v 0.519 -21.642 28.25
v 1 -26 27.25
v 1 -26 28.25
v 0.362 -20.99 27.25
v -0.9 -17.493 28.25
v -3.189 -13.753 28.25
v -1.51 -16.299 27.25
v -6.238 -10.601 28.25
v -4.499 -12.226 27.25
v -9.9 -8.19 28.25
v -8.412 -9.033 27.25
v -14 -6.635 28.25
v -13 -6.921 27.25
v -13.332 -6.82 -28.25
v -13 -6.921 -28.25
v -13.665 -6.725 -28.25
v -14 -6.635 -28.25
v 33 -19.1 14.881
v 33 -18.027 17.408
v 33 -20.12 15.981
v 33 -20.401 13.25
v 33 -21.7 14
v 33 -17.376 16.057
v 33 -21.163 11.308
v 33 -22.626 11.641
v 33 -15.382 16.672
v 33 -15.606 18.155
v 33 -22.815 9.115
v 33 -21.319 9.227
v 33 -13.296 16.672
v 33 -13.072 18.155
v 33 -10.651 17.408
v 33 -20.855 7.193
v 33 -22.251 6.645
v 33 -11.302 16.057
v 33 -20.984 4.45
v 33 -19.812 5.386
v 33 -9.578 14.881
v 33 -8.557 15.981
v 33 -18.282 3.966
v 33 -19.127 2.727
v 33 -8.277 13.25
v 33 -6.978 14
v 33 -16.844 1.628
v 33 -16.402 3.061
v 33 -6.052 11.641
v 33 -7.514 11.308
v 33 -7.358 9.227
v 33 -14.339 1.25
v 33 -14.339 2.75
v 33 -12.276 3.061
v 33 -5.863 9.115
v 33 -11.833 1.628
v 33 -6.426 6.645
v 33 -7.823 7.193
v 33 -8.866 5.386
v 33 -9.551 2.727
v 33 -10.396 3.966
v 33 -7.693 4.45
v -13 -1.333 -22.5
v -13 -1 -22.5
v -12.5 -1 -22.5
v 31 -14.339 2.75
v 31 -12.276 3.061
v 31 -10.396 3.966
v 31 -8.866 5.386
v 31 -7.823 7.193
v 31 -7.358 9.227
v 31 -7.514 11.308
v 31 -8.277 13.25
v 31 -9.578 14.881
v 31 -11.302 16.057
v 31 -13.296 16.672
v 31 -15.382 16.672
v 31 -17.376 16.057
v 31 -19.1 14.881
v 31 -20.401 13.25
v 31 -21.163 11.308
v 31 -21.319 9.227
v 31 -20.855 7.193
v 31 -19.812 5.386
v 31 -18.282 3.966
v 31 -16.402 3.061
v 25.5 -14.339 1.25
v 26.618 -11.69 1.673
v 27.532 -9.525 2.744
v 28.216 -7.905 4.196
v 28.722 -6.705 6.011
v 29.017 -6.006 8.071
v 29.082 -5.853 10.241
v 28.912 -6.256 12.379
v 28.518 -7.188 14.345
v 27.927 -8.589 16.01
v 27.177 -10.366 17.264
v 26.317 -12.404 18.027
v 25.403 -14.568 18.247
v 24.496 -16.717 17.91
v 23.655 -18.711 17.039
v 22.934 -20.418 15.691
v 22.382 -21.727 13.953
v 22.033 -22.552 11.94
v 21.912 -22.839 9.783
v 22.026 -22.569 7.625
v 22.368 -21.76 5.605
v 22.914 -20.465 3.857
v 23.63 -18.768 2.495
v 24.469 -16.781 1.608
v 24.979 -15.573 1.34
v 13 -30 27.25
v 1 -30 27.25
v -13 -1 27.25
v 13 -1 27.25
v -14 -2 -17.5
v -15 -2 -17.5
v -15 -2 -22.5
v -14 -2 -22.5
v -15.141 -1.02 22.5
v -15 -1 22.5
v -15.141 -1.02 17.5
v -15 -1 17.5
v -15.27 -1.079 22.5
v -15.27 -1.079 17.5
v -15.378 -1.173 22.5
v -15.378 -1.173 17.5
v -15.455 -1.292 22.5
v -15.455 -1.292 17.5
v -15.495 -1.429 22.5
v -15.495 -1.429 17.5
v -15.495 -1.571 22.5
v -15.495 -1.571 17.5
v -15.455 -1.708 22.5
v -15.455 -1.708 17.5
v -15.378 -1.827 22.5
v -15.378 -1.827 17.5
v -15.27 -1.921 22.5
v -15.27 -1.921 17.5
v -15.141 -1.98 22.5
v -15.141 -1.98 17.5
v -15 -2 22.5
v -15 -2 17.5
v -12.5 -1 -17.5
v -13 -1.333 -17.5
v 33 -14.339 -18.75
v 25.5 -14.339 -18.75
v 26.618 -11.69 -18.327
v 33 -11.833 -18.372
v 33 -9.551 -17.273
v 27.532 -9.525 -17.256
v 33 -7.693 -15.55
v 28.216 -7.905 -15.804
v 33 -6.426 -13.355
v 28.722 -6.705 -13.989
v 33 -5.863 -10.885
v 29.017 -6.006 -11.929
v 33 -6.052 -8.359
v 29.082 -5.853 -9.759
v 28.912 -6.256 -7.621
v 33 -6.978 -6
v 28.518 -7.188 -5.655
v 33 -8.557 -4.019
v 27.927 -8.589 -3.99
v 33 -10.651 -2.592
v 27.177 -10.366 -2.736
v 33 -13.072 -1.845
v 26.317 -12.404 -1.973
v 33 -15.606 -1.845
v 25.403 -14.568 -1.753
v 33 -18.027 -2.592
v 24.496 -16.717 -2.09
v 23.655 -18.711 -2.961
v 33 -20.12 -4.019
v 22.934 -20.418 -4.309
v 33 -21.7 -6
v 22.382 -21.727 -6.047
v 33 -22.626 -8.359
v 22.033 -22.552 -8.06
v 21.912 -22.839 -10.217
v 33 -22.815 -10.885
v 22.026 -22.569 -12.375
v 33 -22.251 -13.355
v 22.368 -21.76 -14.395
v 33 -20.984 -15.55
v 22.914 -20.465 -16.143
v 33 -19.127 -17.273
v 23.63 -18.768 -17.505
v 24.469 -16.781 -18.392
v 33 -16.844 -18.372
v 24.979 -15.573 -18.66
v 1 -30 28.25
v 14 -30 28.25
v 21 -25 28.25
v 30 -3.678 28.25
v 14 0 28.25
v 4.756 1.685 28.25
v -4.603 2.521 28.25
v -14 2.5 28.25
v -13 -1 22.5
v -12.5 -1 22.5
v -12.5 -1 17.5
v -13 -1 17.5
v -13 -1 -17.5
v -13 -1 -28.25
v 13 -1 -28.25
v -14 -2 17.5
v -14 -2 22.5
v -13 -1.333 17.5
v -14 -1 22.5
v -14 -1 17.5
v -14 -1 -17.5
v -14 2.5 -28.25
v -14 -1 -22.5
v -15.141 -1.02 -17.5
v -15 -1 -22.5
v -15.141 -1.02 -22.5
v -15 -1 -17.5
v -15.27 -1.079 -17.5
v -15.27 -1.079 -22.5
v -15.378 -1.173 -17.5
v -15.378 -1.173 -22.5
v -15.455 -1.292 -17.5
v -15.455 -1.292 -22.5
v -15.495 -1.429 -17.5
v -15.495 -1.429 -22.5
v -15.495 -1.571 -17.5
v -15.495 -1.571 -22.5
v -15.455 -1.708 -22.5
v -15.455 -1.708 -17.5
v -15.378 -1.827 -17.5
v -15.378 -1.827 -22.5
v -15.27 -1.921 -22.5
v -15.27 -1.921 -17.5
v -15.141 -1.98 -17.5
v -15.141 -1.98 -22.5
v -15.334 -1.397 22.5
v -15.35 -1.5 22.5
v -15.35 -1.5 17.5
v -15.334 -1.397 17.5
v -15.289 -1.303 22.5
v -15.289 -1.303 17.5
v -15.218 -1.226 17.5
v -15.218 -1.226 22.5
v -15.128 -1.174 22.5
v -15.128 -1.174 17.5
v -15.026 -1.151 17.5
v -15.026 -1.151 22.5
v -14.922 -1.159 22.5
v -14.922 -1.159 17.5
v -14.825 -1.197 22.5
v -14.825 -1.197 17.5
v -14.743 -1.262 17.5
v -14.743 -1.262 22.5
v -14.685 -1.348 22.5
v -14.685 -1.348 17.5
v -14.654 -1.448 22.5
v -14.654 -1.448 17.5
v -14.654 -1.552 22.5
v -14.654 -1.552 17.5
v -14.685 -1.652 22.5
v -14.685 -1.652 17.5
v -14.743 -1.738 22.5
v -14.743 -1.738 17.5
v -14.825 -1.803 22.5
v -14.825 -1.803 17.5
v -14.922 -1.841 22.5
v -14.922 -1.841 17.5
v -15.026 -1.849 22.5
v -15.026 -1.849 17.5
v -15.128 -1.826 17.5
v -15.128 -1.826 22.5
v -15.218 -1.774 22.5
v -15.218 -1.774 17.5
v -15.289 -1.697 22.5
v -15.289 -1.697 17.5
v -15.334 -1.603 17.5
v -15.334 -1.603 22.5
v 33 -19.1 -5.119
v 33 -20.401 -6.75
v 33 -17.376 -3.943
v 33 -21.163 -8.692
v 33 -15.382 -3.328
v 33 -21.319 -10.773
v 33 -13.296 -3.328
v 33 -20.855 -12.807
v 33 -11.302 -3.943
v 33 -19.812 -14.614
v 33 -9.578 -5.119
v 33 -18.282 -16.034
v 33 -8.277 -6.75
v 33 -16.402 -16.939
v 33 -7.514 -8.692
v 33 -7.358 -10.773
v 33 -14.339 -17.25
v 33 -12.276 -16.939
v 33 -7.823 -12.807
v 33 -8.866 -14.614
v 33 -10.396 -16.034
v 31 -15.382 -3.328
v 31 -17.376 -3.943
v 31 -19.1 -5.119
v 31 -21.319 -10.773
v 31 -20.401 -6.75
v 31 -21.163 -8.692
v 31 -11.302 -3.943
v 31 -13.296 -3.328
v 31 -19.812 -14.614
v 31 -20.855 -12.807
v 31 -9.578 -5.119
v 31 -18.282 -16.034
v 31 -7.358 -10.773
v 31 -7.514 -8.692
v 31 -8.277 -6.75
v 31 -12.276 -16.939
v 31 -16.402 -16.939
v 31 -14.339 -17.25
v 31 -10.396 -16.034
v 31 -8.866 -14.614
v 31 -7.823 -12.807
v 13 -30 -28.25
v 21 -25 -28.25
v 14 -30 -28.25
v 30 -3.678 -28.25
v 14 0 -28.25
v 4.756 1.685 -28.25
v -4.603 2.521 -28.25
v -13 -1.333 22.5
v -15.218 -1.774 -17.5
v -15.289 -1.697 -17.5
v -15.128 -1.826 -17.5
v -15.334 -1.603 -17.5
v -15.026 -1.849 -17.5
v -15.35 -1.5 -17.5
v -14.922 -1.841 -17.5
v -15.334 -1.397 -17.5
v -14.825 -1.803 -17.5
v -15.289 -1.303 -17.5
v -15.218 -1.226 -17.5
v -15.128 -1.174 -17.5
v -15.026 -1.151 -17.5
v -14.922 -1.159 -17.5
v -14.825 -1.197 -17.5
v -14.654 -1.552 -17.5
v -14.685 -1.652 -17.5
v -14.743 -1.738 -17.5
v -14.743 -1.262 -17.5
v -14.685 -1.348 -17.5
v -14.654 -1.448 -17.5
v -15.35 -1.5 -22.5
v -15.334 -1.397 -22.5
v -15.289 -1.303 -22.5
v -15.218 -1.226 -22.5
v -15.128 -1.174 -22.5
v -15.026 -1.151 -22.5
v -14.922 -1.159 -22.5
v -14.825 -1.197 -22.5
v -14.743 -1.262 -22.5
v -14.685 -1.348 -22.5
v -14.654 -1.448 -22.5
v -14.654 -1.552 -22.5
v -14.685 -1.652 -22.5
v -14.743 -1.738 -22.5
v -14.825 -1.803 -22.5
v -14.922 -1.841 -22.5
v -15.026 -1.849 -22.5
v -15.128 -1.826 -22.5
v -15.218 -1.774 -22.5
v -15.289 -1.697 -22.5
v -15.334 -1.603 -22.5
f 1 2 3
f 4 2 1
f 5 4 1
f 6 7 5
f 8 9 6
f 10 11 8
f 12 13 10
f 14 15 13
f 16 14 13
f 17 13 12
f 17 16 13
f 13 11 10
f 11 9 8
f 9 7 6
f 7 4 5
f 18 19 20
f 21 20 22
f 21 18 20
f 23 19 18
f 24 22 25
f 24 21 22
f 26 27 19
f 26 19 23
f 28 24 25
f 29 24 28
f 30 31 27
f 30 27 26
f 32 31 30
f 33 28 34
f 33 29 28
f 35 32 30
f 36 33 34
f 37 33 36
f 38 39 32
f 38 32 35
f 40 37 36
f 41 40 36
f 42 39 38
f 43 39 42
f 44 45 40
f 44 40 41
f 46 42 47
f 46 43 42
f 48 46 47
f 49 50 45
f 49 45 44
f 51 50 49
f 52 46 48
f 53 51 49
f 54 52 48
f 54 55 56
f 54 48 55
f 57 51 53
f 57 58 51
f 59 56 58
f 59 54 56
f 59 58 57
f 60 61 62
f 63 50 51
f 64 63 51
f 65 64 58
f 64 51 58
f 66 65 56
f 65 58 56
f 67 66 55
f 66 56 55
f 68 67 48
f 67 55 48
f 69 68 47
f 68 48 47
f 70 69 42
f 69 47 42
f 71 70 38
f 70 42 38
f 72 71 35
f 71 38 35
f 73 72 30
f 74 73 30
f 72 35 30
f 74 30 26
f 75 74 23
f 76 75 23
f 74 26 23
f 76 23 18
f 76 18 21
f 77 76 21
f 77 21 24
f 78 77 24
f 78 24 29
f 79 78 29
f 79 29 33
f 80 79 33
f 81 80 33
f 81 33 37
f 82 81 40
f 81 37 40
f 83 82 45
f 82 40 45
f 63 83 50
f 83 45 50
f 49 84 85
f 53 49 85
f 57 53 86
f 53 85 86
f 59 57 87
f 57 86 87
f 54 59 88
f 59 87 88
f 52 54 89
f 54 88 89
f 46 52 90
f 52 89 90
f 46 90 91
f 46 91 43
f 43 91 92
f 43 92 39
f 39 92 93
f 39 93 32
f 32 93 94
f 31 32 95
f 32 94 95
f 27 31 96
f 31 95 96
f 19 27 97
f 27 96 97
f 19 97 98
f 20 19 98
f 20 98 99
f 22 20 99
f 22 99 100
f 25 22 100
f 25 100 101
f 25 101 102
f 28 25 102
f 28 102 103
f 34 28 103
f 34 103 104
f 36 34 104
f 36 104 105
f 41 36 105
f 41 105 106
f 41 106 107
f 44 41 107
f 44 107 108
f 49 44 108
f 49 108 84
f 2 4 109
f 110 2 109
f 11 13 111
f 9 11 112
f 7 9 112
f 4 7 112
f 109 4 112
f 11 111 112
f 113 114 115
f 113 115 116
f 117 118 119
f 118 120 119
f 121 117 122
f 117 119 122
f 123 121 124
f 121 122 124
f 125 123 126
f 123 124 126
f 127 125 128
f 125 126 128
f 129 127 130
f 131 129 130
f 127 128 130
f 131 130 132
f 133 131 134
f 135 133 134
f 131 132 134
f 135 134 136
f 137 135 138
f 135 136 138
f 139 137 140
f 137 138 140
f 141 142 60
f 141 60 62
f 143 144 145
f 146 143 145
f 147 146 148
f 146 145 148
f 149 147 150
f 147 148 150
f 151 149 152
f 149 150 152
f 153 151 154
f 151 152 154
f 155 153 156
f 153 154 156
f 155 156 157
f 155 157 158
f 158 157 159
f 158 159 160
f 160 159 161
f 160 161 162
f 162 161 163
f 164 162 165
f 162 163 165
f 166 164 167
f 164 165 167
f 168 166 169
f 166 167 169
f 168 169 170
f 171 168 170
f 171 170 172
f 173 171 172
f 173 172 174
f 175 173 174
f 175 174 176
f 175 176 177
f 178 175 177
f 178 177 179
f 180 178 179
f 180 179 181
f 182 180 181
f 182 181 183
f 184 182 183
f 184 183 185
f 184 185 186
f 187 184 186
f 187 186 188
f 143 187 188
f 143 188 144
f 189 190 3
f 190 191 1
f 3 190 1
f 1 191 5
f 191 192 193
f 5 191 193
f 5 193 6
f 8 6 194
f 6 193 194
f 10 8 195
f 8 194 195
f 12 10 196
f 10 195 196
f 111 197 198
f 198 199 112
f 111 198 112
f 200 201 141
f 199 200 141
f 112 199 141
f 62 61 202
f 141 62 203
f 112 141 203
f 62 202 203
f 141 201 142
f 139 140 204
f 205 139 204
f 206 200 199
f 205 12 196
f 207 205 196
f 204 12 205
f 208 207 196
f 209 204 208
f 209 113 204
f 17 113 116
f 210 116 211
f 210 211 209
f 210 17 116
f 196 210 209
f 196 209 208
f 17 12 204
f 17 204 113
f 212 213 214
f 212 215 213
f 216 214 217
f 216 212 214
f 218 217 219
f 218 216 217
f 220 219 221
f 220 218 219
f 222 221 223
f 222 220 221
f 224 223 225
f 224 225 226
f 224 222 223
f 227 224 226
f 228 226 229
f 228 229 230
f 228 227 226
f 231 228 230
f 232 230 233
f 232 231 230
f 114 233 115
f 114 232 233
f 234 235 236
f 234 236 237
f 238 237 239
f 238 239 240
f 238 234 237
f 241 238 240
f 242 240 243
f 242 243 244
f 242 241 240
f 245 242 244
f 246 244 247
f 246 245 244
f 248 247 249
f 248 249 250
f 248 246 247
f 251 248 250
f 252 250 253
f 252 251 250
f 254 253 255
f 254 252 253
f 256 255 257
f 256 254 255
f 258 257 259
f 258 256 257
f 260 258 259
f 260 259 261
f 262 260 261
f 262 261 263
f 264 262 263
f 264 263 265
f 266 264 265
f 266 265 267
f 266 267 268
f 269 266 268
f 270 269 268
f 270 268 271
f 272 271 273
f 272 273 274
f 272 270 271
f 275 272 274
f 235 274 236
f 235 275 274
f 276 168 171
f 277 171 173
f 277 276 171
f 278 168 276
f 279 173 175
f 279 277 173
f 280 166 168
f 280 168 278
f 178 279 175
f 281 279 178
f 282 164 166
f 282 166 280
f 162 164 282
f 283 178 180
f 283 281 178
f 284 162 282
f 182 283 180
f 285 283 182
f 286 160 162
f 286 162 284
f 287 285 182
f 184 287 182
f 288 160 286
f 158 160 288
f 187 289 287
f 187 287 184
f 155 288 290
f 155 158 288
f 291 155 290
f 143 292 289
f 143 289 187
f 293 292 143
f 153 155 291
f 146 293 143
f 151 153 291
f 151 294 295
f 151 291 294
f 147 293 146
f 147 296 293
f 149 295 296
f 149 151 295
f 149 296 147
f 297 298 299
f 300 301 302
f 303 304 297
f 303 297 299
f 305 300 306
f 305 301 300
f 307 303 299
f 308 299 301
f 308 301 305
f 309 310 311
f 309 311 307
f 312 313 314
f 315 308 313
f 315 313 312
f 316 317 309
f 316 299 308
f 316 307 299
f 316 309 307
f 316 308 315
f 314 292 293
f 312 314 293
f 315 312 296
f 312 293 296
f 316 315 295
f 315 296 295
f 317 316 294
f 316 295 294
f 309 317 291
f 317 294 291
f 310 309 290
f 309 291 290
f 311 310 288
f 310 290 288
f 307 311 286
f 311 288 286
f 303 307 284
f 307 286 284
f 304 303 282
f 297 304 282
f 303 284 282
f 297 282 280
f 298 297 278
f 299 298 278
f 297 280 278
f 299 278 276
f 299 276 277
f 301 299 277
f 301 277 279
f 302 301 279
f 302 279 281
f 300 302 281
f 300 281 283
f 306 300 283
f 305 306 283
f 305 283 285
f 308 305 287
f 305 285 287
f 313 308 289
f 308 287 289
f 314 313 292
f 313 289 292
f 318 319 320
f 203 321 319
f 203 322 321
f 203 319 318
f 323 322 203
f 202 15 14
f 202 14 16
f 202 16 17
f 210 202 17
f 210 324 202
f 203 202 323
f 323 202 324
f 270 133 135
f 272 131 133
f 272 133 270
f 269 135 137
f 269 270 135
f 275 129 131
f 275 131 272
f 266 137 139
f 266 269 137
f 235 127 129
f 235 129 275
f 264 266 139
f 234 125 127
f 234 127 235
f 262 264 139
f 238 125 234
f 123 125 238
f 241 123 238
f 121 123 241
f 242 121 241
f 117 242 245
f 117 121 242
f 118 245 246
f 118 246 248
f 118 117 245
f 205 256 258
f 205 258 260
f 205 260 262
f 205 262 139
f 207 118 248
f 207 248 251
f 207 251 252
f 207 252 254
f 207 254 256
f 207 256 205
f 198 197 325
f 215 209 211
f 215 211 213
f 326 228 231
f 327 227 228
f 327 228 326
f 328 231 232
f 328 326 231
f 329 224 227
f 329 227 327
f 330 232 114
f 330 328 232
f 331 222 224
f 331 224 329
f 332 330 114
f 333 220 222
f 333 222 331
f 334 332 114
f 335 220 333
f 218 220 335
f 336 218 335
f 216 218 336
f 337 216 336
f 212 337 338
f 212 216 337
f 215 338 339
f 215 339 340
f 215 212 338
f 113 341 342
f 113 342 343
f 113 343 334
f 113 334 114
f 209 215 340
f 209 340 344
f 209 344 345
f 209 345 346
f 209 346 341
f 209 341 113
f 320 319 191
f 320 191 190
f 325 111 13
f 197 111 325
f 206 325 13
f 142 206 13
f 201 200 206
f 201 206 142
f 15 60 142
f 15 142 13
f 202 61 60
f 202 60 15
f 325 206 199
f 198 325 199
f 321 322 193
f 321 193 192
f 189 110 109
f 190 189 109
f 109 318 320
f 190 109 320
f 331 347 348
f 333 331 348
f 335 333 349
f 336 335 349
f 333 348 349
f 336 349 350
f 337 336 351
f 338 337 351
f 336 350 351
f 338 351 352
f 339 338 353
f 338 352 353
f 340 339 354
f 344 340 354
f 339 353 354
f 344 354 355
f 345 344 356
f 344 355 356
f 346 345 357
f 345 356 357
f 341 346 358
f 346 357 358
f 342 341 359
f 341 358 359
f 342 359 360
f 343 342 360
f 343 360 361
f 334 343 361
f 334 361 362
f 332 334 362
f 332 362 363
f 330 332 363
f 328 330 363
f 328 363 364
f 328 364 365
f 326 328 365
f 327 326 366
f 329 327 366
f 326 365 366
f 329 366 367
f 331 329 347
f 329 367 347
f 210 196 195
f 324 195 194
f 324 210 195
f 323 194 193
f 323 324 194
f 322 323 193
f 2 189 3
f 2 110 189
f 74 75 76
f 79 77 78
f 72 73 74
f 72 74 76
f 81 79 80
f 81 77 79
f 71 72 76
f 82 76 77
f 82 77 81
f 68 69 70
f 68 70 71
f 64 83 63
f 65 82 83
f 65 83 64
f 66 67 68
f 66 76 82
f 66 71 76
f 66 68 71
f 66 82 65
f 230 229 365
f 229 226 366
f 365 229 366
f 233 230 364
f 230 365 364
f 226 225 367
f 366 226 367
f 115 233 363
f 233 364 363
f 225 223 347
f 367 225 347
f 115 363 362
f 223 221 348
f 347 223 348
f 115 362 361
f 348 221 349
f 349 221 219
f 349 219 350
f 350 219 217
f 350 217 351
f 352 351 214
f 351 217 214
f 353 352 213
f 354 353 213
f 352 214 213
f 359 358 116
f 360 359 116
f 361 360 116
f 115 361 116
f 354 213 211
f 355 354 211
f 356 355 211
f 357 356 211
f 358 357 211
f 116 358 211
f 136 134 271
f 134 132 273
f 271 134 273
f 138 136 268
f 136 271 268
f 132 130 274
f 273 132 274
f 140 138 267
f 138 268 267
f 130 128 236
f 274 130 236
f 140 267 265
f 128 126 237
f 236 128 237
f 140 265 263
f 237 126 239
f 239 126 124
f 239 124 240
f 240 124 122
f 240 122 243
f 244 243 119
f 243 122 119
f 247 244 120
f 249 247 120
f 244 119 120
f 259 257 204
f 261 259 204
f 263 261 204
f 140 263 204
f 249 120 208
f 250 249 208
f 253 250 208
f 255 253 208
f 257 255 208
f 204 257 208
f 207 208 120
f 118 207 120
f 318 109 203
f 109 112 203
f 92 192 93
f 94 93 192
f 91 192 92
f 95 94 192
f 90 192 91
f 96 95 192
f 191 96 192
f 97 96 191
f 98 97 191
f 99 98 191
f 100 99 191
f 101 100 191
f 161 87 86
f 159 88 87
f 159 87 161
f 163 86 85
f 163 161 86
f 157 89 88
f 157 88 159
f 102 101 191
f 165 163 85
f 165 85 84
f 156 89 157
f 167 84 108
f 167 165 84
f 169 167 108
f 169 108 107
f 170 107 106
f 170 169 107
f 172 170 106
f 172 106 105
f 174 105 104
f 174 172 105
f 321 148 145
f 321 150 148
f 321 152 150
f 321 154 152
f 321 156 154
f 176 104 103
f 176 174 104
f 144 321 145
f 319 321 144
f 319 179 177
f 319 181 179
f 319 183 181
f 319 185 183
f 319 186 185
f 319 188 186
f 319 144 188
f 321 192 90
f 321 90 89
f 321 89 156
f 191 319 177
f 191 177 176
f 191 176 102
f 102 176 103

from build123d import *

# Parameters (mm, degrees)
SKETCH1_W           = 28
SKETCH1_H           = 56.5
BOSS_EXTRUDE1_DEPTH = 30
CUT_EXTRUDE2_DEPTH  = 56.5
SHELL1_T            = -1
BOSS_EXTRUDE3_DEPTH = 2.5
SKETCH4_R           = 0.35
CUT_EXTRUDE1_DEPTH  = 5
BOSS_EXTRUDE4_DEPTH = 56.5
BOSS_EXTRUDE5_START = -11.087816
SKETCH7_R           = 8.5
BOSS_EXTRUDE5_DEPTH = 11.087816
SKETCH8_R           = 7
CUT_EXTRUDE3_DEPTH  = 2
LPATTERN1_COUNT     = 2
LPATTERN1_PITCH     = 20


with BuildPart() as part:
    # Sketch1 → Boss-Extrude1 (new body)
    with BuildSketch(Plane(origin=(0, 0, 0), x_dir=(1, 0, 0), z_dir=(0, 1, 0))):
        Rectangle(SKETCH1_W, SKETCH1_H)
    extrude(amount=-BOSS_EXTRUDE1_DEPTH)

    # Sketch5 → Cut-Extrude2 (cut)
    with BuildSketch(Plane(origin=(0, 0, -28.25), x_dir=(-1, 0, 0), z_dir=(0, 0, -1))):
        with BuildLine():
            Line((-1, -30), (-1, -26))
            ThreePointArc((-1, -26), (3.188611699, -13.752551286), (14, -6.635083269))
            Line((14, -6.635083269), (14, -30))
            Line((14, -30), (-1, -30))
        make_face()
    extrude(amount=-CUT_EXTRUDE2_DEPTH, mode=Mode.SUBTRACT)

    # Shell1
    shell1_openings = [part.faces().sort_by_distance(p)[0] for p in [
        (7.5, -30, 0),
        (0.885231383, -15.011682153, -28.25),
        (-4.84430585, -15.03504646, 0),
        (1, -28, 0),
    ]]
    offset(amount=SHELL1_T, openings=shell1_openings, kind=Kind.INTERSECTION)

    # Sketch3 → Boss-Extrude3 (add, symmetric)
    with BuildSketch(Plane.XY.offset(-20)):
        with BuildLine():
            Line((-14, -1), (-15, -1))
            ThreePointArc((-15, -1), (-15.5, -1.5), (-15, -2))
            Line((-15, -2), (-14, -2))
            Line((-14, -2), (-12.5, -1))
            Line((-12.5, -1), (-14, -1))
        make_face()
    boss_extrude3 = extrude(amount=BOSS_EXTRUDE3_DEPTH, both=True)

    # Sketch4 → Cut-Extrude1 (cut)
    with BuildSketch(Plane(origin=(0, 0, -22.5), x_dir=(-1, 0, 0), z_dir=(0, 0, -1))):
        with Locations((15, -1.5)):
            Circle(SKETCH4_R)
    cut_extrude1 = extrude(amount=-CUT_EXTRUDE1_DEPTH, mode=Mode.SUBTRACT)

    # Mirror1: Boss-Extrude3, Cut-Extrude1 across plane
    add(boss_extrude3.mirror(Plane.XY))
    add(cut_extrude1.mirror(Plane.XY), mode=Mode.SUBTRACT)

    # Sketch6 → Boss-Extrude4 (add)
    with BuildSketch(Plane(origin=(0, 0, -28.25), x_dir=(-1, 0, 0), z_dir=(0, 0, -1))):
        Polygon((-30, -3.677832944), (-21, -25), (-14, -30), (-14, 0), align=None)
        with BuildLine():
            Line((14, 0), (14, 2.5))
            ThreePointArc((14, 2.5), (-0.085690207, 2.209730318), (-14, 0))
            Line((-14, 0), (14, 0))
        make_face()
    extrude(amount=-BOSS_EXTRUDE4_DEPTH)

    # Sketch7 → Boss-Extrude5 (add)
    with BuildSketch(Plane(origin=(33, 0, 0), x_dir=(0, 0, -1), z_dir=(1, 0, 0)).offset(BOSS_EXTRUDE5_START)):
        with Locations((10.25, -14.338916472)):
            Circle(SKETCH7_R)
    boss_extrude5 = extrude(amount=BOSS_EXTRUDE5_DEPTH)

    # Sketch8 → Cut-Extrude3 (cut)
    with BuildSketch(Plane(origin=(33, 0, 0), x_dir=(0, 0, -1), z_dir=(1, 0, 0))):
        with Locations((10.25, -14.338916472)):
            Circle(SKETCH8_R)
    cut_extrude3 = extrude(amount=-CUT_EXTRUDE3_DEPTH, mode=Mode.SUBTRACT)

    # LPattern1: Boss-Extrude5, Cut-Extrude3 ×2
    with Locations(*[(0, 0, i * LPATTERN1_PITCH) for i in range(1, LPATTERN1_COUNT)]):
        add(boss_extrude5)
        add(cut_extrude3, mode=Mode.SUBTRACT)


solid = part.part
